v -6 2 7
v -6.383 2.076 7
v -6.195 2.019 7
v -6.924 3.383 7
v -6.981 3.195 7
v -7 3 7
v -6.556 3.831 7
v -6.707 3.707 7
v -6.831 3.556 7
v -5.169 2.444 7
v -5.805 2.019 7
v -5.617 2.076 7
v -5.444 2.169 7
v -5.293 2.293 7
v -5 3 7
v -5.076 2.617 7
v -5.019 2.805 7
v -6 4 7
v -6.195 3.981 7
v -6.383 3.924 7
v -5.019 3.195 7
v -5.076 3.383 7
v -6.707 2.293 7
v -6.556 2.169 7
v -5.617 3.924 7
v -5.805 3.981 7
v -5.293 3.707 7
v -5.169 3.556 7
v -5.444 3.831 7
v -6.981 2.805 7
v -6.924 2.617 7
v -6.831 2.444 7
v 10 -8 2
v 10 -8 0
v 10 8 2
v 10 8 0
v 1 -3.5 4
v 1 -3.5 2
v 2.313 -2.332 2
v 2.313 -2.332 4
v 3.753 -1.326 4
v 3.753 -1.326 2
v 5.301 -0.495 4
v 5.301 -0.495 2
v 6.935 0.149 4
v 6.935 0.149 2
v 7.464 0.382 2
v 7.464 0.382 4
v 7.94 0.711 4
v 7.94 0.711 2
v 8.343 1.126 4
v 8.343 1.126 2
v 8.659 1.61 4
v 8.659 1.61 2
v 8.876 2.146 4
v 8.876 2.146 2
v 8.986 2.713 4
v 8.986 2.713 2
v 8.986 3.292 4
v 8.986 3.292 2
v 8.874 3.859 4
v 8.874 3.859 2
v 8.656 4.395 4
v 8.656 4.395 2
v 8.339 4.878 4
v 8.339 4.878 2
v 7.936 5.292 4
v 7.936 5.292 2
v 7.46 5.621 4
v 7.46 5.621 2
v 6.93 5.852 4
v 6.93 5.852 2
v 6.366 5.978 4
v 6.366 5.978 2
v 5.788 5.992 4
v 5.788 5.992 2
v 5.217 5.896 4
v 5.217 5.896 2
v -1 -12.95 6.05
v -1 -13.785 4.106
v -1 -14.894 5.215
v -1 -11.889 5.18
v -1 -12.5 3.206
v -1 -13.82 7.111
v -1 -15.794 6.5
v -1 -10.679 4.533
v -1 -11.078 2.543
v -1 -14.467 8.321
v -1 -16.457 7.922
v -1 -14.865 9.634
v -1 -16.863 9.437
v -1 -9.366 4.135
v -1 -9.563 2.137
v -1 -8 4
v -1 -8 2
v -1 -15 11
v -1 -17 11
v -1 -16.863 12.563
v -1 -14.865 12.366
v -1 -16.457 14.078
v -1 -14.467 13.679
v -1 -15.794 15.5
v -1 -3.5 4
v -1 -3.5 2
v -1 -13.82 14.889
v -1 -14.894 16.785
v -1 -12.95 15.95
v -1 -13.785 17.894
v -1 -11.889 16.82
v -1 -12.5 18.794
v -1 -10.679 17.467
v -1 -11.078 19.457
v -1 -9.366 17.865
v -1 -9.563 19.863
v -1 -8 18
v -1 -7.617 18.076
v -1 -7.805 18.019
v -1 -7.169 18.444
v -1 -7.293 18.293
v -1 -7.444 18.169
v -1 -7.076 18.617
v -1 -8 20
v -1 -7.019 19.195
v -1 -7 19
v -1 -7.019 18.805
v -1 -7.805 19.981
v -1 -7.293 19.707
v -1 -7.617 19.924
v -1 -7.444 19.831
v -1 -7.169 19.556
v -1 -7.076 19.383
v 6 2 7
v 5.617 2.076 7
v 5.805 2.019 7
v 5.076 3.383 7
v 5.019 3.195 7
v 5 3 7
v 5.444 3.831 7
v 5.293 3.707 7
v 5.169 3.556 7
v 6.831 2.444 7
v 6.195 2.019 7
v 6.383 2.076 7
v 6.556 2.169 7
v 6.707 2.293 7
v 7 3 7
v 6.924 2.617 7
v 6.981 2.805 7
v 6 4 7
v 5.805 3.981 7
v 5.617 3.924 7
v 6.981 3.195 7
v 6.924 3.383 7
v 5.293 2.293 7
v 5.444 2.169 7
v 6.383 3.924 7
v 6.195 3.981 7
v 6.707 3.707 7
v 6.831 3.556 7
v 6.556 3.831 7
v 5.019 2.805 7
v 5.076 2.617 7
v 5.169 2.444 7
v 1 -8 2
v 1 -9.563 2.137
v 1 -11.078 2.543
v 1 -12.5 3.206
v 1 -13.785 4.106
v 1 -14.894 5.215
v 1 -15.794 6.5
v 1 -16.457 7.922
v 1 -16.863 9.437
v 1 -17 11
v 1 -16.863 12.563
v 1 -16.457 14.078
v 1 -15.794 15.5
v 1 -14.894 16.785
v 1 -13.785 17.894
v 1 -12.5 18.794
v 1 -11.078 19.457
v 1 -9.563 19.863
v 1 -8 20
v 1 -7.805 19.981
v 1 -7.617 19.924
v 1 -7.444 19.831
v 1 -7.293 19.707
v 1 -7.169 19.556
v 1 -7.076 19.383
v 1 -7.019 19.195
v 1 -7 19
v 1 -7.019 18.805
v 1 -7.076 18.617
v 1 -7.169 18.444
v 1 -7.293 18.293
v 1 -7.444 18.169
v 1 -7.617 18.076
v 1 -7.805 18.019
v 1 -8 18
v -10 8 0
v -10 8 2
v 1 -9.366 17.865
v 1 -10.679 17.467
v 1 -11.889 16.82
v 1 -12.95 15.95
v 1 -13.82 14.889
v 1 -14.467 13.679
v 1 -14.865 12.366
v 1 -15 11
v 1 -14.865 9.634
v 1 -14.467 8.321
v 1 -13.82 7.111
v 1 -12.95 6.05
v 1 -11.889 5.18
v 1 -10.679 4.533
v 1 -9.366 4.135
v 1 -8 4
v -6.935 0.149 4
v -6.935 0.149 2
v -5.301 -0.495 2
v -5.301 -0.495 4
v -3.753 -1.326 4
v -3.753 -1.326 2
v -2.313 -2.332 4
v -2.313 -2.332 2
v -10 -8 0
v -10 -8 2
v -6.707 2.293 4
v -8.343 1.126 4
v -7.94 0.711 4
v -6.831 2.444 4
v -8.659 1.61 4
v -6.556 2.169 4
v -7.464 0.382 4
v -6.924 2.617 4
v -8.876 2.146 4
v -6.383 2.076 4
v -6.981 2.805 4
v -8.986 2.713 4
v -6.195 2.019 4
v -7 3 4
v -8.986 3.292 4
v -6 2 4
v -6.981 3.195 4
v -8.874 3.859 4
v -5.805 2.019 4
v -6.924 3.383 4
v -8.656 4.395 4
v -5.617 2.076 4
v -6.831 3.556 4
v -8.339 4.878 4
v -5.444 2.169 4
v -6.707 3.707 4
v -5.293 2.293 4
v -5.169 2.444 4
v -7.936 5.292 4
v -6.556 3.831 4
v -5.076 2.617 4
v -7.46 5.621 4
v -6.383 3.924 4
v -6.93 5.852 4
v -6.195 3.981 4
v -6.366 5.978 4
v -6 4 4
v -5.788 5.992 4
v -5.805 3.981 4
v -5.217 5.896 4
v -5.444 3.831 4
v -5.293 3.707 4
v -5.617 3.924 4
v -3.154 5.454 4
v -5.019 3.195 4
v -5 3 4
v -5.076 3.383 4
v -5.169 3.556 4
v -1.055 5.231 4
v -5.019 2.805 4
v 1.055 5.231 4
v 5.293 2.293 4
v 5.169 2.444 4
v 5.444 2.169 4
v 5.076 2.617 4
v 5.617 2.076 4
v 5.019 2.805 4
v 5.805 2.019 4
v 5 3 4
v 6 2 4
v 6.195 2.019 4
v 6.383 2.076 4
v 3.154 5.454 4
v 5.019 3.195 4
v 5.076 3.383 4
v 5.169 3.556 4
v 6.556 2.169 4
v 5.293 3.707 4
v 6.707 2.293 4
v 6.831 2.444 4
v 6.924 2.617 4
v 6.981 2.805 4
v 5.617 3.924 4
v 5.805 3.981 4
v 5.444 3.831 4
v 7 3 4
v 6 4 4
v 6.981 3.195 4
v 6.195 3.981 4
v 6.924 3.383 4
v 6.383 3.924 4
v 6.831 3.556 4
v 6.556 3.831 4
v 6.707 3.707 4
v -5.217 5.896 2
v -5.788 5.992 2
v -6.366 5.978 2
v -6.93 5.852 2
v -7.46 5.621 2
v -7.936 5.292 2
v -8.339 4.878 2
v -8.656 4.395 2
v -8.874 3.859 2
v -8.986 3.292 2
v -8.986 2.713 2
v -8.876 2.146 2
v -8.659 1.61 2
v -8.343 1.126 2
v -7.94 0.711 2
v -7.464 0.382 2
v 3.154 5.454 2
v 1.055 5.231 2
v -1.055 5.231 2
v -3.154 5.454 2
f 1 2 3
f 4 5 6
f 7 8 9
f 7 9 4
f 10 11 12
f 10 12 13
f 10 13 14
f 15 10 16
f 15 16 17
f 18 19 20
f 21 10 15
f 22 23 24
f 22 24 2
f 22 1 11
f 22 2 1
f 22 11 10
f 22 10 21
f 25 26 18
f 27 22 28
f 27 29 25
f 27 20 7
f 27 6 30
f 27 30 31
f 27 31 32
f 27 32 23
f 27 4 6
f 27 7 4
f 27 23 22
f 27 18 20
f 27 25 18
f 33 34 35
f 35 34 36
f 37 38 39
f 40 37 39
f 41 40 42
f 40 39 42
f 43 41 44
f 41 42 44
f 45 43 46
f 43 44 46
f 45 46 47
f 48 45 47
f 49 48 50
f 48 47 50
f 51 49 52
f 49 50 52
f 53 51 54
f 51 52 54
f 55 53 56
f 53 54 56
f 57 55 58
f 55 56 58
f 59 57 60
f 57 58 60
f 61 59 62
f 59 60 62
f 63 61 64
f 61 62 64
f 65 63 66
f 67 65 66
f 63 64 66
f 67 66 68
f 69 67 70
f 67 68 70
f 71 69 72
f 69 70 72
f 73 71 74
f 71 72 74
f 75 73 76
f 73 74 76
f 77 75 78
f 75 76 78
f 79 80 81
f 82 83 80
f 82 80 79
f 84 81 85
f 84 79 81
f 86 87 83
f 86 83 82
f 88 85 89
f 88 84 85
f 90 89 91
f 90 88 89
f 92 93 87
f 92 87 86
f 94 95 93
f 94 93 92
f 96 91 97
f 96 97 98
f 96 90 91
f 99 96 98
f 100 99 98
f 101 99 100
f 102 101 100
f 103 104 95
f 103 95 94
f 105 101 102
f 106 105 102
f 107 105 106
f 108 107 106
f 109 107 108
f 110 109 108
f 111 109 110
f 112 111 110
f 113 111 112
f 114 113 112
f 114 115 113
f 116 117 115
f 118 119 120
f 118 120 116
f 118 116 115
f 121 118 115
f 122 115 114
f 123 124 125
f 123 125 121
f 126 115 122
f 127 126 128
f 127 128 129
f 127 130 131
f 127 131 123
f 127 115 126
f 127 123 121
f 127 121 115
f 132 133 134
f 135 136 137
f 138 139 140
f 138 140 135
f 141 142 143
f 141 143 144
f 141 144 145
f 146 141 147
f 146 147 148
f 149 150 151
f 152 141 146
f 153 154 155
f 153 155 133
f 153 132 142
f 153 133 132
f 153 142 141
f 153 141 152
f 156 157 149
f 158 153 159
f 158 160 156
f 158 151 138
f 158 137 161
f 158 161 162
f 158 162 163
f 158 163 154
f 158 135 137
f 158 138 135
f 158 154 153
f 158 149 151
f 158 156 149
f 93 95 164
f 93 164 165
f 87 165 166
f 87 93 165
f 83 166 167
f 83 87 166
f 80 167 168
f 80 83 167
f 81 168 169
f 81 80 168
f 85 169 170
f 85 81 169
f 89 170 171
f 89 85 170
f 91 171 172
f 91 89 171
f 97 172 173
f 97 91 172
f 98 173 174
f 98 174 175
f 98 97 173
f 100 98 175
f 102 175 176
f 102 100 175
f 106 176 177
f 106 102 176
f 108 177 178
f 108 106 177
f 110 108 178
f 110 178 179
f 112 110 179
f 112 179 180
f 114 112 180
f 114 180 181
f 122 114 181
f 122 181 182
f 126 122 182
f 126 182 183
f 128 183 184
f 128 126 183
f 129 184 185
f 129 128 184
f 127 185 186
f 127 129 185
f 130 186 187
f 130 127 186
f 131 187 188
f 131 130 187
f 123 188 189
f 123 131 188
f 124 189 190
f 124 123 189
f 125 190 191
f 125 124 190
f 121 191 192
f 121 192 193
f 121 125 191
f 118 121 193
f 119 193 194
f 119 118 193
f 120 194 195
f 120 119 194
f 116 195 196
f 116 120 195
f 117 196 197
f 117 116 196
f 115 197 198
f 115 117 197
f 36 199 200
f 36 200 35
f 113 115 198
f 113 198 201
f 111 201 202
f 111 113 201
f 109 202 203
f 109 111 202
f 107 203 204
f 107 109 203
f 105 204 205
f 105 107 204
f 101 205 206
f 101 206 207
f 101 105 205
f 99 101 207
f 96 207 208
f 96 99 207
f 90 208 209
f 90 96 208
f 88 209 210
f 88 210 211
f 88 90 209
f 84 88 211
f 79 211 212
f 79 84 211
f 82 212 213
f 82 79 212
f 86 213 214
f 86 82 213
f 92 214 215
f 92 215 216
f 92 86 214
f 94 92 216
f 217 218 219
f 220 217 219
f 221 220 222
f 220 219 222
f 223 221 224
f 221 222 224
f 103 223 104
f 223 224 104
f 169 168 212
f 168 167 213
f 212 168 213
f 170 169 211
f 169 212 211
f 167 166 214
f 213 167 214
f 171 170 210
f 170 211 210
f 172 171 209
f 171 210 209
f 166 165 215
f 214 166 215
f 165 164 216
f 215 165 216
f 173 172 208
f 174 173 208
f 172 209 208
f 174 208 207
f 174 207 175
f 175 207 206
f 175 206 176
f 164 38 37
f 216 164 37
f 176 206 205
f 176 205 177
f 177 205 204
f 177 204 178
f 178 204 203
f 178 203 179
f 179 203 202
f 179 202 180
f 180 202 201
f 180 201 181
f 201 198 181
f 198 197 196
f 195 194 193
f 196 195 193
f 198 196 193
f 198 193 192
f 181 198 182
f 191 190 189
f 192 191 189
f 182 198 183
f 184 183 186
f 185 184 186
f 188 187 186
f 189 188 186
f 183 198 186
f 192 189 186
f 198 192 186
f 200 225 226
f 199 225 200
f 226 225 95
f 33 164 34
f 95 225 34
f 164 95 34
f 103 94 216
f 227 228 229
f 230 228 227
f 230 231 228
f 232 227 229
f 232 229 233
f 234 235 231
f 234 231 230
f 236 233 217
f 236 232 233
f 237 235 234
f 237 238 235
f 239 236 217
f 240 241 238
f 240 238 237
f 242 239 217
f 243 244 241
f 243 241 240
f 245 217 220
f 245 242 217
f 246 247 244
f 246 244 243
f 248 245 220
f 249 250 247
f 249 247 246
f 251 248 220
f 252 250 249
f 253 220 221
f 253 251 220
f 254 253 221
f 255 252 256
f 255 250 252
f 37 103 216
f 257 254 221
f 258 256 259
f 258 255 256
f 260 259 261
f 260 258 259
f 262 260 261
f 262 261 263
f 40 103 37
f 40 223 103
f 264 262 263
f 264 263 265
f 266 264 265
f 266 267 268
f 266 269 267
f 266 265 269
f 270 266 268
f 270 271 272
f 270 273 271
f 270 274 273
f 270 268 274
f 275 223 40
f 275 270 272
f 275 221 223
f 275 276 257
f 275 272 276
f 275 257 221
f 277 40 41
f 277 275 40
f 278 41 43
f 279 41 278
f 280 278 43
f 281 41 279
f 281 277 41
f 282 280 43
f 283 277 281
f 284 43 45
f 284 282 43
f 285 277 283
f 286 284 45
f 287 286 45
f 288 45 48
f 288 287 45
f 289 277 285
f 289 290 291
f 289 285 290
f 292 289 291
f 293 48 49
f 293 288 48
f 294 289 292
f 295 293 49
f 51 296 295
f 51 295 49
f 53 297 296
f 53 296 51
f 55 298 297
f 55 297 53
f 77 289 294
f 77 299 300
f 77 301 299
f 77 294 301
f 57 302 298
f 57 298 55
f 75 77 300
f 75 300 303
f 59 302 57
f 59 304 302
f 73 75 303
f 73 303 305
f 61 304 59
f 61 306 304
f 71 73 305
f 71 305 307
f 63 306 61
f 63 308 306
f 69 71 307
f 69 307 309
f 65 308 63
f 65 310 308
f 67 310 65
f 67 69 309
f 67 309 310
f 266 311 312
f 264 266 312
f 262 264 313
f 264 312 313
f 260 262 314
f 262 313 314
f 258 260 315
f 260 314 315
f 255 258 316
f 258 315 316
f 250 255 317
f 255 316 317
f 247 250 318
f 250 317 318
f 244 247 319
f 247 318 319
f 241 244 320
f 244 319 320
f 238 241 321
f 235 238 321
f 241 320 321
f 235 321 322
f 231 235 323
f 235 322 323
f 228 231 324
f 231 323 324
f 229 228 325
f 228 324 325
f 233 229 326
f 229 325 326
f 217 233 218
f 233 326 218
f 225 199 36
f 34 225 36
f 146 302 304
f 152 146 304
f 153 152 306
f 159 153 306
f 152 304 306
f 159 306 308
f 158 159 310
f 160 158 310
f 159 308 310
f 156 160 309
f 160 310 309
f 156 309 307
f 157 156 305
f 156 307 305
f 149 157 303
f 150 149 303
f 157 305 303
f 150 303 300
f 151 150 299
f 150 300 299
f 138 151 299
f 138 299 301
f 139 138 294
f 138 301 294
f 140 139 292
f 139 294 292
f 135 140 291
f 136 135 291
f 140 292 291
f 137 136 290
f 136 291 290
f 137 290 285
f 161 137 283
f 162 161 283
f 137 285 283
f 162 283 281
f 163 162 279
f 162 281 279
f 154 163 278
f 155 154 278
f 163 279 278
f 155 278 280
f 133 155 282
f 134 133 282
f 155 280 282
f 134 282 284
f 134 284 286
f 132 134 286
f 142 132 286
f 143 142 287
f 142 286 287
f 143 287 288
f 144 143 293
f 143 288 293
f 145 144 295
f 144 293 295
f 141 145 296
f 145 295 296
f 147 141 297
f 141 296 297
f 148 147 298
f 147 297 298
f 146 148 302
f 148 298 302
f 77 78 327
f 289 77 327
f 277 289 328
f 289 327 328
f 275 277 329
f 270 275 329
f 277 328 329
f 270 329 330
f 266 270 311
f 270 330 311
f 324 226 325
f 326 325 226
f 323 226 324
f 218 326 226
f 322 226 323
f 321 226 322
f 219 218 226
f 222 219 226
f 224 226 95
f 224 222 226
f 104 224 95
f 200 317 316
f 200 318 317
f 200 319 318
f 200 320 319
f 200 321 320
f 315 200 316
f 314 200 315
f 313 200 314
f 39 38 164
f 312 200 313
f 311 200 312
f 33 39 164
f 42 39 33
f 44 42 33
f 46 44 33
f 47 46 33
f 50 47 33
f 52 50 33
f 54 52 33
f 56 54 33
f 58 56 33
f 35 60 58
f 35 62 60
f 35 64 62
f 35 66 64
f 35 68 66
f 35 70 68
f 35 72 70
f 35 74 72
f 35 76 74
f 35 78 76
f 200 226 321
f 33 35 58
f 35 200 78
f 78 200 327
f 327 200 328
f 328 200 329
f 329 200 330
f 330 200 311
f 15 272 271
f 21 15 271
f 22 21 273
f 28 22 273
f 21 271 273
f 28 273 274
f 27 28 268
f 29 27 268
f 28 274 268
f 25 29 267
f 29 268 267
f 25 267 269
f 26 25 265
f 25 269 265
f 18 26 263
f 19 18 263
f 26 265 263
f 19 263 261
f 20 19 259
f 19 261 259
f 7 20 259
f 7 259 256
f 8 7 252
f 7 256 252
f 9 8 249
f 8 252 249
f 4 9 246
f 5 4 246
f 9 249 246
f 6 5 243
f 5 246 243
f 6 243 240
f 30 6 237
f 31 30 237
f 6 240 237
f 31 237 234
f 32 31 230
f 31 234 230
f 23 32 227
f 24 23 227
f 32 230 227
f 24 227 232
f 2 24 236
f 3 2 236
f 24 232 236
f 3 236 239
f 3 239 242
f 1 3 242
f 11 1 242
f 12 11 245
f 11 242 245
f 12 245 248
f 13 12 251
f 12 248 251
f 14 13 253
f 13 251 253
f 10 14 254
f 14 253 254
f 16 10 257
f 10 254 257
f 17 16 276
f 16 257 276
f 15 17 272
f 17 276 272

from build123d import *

# Parameters (mm, degrees)
CROQUIS1_W              = 20
CROQUIS1_H              = 16
SALIENTE_EXTRUIR1_DEPTH = 2
SALIENTE_EXTRUIR2_DEPTH = 2
CROQUIS3_R              = 1
SALIENTE_EXTRUIR3_DEPTH = 3
SALIENTE_EXTRUIR4_DEPTH = 2


with BuildPart() as part:
    # Croquis1 → Saliente-Extruir1 (new body)
    with BuildSketch(Plane.XY):
        Rectangle(CROQUIS1_W, CROQUIS1_H)
    extrude(amount=SALIENTE_EXTRUIR1_DEPTH)

    # Croquis2 → Saliente-Extruir2 (add)
    with BuildSketch(Plane.XY.offset(2)):
        with BuildLine():
            Line((-1, -3.5), (-1, -8))
            Line((-1, -8), (1, -8))
            Line((1, -8), (1, -3.5))
            ThreePointArc((1, -3.5), (3.752648906, -1.325939397), (6.934939372, 0.149405611))
            ThreePointArc((6.934939372, 0.149405611), (8.874367576, 3.859075687), (5.217391304, 5.896122171))
            ThreePointArc((5.217391304, 5.896122171), (0, 5.203603311), (-5.217391304, 5.896122171))
            ThreePointArc((-5.217391304, 5.896122171), (-8.874367576, 3.859075687), (-6.934939372, 0.149405611))
            ThreePointArc((-6.934939372, 0.149405611), (-3.752648906, -1.325939397), (-1, -3.5))
        make_face()
    extrude(amount=SALIENTE_EXTRUIR2_DEPTH)

    # Croquis3 → Saliente-Extruir3 (add)
    with BuildSketch(Plane.XY.offset(4)):
        with Locations((-6, 3)):
            Circle(CROQUIS3_R)
        with Locations((6, 3)):
            Circle(CROQUIS3_R)
    extrude(amount=SALIENTE_EXTRUIR3_DEPTH)

    # Croquis5 → Saliente-Extruir4 (add)
    with BuildSketch(Plane.ZY.offset(1)):
        with BuildLine():
            Line((4, -8), (2, -8))
            ThreePointArc((2, -8), (11, -17), (20, -8))
            ThreePointArc((20, -8), (19, -7), (18, -8))
            ThreePointArc((18, -8), (11, -15), (4, -8))
        make_face()
    extrude(amount=-SALIENTE_EXTRUIR4_DEPTH)


solid = part.part
